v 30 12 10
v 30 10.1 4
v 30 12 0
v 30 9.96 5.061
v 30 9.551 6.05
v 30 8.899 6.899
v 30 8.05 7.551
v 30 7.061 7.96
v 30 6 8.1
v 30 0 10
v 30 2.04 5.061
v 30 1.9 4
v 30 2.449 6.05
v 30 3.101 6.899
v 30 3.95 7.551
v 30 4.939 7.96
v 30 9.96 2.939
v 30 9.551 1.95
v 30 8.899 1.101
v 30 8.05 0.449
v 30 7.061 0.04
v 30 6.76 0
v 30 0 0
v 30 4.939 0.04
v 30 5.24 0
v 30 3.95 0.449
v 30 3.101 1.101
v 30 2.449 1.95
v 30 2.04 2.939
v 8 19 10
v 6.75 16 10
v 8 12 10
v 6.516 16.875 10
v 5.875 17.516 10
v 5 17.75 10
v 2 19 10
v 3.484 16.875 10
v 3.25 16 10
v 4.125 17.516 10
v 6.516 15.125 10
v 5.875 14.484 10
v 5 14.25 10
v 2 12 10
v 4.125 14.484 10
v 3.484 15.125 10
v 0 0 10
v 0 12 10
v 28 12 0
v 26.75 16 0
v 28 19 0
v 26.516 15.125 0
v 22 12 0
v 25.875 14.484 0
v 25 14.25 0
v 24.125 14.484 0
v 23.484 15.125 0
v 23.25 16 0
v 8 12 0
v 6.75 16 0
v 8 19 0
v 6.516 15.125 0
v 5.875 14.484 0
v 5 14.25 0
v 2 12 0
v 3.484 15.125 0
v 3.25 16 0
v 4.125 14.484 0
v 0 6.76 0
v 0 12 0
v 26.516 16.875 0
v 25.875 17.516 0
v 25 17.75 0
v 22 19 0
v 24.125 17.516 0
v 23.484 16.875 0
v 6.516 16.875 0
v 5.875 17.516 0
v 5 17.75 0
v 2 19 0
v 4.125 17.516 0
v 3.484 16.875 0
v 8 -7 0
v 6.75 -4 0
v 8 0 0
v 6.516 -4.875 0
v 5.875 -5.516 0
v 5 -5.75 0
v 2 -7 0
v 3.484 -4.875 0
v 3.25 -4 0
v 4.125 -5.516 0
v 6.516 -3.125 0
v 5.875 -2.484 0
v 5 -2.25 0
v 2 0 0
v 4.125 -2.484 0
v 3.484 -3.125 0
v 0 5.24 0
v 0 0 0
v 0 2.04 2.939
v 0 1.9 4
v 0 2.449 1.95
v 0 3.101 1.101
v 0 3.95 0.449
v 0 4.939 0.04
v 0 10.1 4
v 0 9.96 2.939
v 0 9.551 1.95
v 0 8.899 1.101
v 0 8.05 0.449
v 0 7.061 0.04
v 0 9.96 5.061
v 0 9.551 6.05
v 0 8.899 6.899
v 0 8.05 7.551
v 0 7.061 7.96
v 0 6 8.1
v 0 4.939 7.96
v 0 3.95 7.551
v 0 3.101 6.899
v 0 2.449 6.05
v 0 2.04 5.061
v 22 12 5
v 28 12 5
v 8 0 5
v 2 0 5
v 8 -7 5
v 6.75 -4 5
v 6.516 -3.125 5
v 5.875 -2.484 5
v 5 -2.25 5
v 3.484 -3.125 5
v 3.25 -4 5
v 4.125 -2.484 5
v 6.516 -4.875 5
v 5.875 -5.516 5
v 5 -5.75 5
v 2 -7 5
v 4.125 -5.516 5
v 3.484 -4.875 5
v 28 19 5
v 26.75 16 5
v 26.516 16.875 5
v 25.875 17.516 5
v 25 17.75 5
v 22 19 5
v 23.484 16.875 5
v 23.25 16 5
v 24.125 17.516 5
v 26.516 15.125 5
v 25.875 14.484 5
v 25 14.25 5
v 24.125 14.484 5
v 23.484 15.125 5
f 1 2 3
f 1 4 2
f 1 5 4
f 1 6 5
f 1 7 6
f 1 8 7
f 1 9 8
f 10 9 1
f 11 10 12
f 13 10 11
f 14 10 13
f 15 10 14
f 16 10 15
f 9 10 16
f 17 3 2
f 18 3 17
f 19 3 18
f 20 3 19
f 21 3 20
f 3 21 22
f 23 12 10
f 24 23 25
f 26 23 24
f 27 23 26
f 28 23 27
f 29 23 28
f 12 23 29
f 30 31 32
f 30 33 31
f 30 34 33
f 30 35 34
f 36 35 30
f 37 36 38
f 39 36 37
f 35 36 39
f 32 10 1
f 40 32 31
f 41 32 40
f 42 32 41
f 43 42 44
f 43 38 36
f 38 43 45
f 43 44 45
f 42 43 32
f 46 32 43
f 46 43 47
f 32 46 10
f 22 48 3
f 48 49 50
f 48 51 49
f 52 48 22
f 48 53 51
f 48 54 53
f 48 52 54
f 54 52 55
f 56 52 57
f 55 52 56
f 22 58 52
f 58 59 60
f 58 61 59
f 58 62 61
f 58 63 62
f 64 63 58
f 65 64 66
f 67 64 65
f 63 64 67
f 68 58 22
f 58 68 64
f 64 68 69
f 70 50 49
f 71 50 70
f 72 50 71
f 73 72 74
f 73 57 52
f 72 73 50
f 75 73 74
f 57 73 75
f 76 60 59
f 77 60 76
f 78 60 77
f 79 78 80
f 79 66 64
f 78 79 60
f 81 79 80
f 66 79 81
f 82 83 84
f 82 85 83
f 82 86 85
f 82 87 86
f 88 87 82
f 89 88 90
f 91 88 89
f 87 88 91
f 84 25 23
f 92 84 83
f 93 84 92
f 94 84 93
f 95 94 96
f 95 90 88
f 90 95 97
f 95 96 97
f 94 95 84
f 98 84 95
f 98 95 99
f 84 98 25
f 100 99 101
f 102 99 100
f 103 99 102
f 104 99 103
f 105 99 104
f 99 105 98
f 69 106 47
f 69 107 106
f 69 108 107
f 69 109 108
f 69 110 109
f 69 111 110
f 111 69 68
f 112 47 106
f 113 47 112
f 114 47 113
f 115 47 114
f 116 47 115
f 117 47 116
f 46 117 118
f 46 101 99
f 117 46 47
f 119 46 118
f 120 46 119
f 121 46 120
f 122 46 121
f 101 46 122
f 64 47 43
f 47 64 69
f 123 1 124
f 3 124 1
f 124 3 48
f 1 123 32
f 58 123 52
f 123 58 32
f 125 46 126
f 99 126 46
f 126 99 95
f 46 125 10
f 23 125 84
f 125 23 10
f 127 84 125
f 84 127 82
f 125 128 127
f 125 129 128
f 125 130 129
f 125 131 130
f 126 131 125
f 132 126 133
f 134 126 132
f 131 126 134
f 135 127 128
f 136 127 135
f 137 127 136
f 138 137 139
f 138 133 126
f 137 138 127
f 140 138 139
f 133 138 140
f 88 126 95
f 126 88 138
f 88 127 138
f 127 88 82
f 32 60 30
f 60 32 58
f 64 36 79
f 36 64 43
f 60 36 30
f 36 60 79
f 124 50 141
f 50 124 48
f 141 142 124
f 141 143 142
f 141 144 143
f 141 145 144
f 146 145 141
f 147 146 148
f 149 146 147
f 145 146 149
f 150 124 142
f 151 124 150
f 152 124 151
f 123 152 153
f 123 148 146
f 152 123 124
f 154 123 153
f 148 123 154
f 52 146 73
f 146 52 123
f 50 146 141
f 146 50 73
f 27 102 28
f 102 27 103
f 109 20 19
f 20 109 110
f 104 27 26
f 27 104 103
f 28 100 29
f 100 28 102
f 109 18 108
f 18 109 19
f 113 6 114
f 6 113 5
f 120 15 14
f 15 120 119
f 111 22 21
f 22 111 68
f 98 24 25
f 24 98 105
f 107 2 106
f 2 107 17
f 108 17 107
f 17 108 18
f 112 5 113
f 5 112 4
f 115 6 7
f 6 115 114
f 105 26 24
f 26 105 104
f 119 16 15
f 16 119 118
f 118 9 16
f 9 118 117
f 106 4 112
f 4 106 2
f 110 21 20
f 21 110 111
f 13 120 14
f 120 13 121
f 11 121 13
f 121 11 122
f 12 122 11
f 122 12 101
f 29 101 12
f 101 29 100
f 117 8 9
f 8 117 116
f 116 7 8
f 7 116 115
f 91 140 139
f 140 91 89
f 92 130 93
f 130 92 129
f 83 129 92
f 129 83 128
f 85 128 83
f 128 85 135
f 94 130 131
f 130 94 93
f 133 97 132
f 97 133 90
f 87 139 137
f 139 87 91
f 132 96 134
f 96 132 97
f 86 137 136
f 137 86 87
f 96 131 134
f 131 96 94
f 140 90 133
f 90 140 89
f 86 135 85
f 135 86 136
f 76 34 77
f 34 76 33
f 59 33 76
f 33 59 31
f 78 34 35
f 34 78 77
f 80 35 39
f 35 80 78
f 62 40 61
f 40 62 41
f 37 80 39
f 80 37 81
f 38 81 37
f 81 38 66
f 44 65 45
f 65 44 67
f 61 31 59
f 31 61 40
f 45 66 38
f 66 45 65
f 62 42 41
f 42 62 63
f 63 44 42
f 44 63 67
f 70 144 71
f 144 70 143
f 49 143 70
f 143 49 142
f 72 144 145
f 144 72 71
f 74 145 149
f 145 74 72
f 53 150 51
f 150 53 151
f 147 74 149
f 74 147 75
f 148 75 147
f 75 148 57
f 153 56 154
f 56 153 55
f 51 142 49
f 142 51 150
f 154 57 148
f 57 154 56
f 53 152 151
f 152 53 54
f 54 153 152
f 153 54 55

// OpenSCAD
difference()
{
    union()
    {
        cube([30,12,10]);
        
        translate([2,-4-3,0])
            cube([6,8,5]);
            //cylinder(d=3.5,h=4,$fn=12);
        translate([2,11,0])
            cube([6,8,10]);
        translate([2+20,11,0])
            cube([6,8,5]);
    }
    union()
    {
        translate([0,6,4])
            rotate([0,90,0])
                cylinder(d=8.2,h=30,$fn=24);
        
        translate([5,-4,0])
            cylinder(d=3.5,h=10,$fn=12);
        translate([5,6+6+4,0])
            cylinder(d=3.5,h=10,$fn=12);
        translate([5+20,6+6+4,0])
            cylinder(d=3.5,h=10,$fn=12);
    }
}
